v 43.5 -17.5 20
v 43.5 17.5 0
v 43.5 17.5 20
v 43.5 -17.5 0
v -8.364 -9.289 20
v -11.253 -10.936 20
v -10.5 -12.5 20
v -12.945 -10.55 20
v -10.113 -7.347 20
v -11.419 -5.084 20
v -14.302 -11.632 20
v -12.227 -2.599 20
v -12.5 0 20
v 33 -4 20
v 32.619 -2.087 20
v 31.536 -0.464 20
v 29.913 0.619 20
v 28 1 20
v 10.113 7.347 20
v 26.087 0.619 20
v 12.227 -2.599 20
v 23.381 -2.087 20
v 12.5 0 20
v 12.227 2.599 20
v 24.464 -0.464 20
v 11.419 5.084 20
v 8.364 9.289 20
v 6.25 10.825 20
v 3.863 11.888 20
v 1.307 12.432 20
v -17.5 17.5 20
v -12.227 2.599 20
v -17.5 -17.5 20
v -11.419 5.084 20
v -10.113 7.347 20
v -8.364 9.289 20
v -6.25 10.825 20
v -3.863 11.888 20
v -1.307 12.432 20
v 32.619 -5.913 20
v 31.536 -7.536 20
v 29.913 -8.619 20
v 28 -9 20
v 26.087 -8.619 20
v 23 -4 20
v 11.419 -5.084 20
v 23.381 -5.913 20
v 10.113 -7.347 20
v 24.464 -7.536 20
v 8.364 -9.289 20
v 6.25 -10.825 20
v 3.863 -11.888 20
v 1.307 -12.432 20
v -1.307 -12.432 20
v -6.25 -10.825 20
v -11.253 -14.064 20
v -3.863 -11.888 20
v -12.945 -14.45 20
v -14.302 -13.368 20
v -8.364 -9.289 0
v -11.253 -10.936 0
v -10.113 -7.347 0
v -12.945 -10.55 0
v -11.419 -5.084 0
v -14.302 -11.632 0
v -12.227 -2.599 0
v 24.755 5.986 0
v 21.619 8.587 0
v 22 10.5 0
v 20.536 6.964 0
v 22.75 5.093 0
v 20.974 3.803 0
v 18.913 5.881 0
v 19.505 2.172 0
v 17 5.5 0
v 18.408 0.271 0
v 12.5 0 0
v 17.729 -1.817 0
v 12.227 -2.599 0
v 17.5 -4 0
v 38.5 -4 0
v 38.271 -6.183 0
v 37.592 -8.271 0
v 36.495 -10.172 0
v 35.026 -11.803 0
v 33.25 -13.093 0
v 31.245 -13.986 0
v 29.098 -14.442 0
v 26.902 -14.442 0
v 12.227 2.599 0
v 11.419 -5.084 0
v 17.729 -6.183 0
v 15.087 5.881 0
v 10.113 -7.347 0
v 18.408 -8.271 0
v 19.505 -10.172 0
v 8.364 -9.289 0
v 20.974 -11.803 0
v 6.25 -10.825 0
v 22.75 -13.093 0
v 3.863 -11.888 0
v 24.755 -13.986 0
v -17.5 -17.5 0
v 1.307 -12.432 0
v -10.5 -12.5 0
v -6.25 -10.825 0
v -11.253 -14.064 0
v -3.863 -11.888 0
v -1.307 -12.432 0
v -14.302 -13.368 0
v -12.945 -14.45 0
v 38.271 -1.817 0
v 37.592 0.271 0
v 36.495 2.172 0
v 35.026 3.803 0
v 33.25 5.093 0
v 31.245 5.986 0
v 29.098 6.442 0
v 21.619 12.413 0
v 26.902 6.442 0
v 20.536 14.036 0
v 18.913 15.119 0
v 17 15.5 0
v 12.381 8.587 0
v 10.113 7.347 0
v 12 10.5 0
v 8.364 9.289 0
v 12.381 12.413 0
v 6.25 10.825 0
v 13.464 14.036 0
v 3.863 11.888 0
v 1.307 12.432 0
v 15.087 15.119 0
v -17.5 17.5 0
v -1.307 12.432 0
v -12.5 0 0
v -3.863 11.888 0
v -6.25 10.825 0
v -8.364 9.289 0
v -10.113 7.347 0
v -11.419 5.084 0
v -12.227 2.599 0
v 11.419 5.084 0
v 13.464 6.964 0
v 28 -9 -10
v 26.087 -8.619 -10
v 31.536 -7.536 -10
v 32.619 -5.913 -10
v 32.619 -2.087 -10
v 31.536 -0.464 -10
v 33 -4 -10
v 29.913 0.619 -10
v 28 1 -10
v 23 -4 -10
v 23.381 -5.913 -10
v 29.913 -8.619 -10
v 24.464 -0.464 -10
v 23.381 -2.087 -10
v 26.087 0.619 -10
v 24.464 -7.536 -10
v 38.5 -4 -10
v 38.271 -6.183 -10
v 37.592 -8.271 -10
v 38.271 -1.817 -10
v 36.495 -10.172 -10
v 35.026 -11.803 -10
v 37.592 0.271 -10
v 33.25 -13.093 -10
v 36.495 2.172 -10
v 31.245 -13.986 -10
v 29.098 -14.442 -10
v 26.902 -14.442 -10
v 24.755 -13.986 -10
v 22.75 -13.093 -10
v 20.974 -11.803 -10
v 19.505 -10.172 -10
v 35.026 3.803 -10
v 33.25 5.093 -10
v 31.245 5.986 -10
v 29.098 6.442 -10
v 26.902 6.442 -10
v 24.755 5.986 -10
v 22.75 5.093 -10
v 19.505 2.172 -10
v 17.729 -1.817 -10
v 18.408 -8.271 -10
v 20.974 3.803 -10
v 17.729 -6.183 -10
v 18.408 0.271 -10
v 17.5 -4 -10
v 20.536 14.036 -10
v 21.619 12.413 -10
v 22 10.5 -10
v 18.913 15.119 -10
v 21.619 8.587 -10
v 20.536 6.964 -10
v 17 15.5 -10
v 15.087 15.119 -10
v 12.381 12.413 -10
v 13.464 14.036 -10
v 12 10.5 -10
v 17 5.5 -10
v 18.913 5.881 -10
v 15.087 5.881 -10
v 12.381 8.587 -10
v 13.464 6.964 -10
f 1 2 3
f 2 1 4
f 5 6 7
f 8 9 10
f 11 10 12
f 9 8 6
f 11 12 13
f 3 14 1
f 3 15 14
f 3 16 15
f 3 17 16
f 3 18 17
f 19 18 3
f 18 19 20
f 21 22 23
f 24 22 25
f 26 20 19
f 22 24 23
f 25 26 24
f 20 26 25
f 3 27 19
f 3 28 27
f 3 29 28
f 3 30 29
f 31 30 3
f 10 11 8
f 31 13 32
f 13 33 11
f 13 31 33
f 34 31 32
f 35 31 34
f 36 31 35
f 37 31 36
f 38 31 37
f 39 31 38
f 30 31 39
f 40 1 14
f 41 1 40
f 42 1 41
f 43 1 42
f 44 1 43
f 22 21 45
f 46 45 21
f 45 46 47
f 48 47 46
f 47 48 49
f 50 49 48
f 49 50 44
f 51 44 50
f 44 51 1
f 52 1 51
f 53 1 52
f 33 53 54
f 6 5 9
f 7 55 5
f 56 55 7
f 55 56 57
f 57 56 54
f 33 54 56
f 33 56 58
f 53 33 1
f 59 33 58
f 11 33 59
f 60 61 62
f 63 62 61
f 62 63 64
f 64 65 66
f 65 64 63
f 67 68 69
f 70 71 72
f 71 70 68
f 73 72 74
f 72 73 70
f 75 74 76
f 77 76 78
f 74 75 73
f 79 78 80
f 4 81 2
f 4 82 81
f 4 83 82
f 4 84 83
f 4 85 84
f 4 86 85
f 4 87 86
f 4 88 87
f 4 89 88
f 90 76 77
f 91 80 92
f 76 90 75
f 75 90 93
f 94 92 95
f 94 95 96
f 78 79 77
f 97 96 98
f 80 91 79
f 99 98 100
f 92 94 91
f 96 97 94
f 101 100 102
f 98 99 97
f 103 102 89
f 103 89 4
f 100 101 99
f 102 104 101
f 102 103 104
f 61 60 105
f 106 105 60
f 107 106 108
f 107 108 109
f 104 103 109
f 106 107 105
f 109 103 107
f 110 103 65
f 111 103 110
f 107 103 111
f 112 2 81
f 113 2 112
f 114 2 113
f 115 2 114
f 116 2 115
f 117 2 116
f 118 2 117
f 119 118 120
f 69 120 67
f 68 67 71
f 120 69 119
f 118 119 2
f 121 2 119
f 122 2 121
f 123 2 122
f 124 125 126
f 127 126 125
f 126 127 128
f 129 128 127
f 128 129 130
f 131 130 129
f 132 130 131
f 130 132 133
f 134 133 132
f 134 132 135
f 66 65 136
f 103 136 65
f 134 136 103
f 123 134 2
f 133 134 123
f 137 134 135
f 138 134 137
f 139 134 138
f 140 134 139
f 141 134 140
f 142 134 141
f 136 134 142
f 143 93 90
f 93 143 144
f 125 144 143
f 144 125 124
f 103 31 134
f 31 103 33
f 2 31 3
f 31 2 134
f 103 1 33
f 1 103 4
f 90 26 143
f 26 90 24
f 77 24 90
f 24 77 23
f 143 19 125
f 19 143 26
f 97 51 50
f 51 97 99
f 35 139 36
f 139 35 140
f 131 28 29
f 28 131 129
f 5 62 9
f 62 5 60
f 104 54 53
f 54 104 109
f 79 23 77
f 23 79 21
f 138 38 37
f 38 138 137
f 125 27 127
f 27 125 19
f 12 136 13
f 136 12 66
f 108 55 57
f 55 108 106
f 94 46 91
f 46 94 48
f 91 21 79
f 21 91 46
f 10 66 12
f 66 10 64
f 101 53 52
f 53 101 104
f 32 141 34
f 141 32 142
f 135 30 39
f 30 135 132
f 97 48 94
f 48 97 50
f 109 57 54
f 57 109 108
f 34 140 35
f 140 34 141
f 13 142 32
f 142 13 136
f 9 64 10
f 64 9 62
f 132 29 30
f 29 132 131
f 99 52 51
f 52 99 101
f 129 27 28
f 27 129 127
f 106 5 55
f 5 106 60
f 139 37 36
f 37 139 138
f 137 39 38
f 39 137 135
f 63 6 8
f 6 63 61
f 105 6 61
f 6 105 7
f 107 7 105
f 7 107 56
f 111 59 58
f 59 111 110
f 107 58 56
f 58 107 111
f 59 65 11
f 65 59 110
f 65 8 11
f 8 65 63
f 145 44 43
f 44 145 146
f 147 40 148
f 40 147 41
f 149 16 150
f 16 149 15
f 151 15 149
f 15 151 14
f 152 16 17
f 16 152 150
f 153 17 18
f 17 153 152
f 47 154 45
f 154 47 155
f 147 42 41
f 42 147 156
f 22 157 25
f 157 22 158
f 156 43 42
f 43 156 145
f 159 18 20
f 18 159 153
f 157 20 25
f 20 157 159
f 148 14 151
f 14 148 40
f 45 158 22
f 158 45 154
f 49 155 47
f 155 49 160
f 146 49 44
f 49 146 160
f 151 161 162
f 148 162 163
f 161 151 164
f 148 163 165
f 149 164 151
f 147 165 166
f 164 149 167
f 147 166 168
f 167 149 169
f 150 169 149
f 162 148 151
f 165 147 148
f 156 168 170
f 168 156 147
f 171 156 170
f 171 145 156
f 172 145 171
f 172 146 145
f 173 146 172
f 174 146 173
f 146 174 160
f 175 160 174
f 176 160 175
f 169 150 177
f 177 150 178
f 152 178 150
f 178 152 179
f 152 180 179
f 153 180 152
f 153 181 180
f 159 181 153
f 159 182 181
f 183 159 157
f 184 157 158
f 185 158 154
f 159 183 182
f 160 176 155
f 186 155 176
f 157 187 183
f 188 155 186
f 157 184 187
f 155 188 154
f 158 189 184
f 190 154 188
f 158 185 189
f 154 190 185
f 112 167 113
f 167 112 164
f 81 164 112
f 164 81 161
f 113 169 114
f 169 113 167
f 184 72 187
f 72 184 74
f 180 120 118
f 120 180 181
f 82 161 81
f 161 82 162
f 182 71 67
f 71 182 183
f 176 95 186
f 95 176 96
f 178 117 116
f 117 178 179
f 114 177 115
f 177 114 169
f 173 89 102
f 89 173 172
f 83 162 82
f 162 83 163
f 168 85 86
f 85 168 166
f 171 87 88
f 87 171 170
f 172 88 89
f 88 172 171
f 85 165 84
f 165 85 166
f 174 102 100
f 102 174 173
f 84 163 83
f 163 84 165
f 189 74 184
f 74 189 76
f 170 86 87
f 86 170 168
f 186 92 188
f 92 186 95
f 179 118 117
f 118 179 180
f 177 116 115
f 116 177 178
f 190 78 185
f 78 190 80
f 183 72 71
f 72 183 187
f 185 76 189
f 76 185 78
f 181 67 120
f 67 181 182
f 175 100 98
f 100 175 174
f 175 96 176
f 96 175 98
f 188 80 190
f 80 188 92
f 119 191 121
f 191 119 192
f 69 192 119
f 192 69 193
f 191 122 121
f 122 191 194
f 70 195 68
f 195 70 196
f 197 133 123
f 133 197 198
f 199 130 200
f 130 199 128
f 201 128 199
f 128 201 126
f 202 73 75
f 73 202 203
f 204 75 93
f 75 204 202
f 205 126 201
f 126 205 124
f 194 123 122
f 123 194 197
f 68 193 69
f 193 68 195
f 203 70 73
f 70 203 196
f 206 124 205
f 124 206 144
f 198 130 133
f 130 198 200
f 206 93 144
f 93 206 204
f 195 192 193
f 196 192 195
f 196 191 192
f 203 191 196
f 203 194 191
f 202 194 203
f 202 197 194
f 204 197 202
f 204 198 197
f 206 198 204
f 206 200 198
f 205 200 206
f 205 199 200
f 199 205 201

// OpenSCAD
// file: Parameters.scad
//Main tube diameter [mm]
main_tube_outer_diameter = 25;
main_tube_inner_diameter = 21;

//Tube for undercarriage [mm]
tube_for_undercarriage_outer_diameter = 10;
tube_for_undercarriage_inner_diameter = 5;

//Screw diameter in model 666_1019 [mm]
M4_screw_diameter=4;
// main file
include <./Parameters.scad>
wall_thickness = main_tube_outer_diameter/5;
width = wall_thickness * 3 + main_tube_outer_diameter + main_tube_inner_diameter;
depth = main_tube_outer_diameter + wall_thickness * 2;
height = 20;
protrusion_height = 10;

difference () {

translate ([-(main_tube_outer_diameter/2+wall_thickness),-(main_tube_outer_diameter/2+wall_thickness),0])
cube ([width,depth,height]);

cylinder (h = height, r1 = main_tube_outer_diameter/2, r2 = main_tube_outer_diameter/2);

translate ([-main_tube_outer_diameter/2,-main_tube_outer_diameter/2,0])
cylinder (h = height, r1 = M4_screw_diameter/2, r2 = M4_screw_diameter/2);

translate ([main_tube_outer_diameter/2 + wall_thickness + main_tube_inner_diameter/2,-4,0])
cylinder (h = height, r1 = tube_for_undercarriage_outer_diameter/2, r2 = tube_for_undercarriage_outer_diameter/2);

}

union () {

	difference(){

	translate ([main_tube_outer_diameter/2 + wall_thickness + main_tube_inner_diameter/2,-4,-(protrusion_height)])
	cylinder (h = protrusion_height, r1 = main_tube_inner_diameter/2, r2 = main_tube_inner_diameter/2);

		translate ([main_tube_outer_diameter/2 + wall_thickness + main_tube_inner_diameter/2,-4,-protrusion_height])
		cylinder (h = protrusion_height, r1 = tube_for_undercarriage_outer_diameter/2, r2 = tube_for_undercarriage_outer_diameter/2);


}
}

union(){

	translate ([main_tube_outer_diameter/2 + wall_thickness/2+2,main_tube_outer_diameter/2 - 2,-protrusion_height])
	cylinder (h = protrusion_height, r1 = tube_for_undercarriage_inner_diameter, r2 = tube_for_undercarriage_inner_diameter);

}
